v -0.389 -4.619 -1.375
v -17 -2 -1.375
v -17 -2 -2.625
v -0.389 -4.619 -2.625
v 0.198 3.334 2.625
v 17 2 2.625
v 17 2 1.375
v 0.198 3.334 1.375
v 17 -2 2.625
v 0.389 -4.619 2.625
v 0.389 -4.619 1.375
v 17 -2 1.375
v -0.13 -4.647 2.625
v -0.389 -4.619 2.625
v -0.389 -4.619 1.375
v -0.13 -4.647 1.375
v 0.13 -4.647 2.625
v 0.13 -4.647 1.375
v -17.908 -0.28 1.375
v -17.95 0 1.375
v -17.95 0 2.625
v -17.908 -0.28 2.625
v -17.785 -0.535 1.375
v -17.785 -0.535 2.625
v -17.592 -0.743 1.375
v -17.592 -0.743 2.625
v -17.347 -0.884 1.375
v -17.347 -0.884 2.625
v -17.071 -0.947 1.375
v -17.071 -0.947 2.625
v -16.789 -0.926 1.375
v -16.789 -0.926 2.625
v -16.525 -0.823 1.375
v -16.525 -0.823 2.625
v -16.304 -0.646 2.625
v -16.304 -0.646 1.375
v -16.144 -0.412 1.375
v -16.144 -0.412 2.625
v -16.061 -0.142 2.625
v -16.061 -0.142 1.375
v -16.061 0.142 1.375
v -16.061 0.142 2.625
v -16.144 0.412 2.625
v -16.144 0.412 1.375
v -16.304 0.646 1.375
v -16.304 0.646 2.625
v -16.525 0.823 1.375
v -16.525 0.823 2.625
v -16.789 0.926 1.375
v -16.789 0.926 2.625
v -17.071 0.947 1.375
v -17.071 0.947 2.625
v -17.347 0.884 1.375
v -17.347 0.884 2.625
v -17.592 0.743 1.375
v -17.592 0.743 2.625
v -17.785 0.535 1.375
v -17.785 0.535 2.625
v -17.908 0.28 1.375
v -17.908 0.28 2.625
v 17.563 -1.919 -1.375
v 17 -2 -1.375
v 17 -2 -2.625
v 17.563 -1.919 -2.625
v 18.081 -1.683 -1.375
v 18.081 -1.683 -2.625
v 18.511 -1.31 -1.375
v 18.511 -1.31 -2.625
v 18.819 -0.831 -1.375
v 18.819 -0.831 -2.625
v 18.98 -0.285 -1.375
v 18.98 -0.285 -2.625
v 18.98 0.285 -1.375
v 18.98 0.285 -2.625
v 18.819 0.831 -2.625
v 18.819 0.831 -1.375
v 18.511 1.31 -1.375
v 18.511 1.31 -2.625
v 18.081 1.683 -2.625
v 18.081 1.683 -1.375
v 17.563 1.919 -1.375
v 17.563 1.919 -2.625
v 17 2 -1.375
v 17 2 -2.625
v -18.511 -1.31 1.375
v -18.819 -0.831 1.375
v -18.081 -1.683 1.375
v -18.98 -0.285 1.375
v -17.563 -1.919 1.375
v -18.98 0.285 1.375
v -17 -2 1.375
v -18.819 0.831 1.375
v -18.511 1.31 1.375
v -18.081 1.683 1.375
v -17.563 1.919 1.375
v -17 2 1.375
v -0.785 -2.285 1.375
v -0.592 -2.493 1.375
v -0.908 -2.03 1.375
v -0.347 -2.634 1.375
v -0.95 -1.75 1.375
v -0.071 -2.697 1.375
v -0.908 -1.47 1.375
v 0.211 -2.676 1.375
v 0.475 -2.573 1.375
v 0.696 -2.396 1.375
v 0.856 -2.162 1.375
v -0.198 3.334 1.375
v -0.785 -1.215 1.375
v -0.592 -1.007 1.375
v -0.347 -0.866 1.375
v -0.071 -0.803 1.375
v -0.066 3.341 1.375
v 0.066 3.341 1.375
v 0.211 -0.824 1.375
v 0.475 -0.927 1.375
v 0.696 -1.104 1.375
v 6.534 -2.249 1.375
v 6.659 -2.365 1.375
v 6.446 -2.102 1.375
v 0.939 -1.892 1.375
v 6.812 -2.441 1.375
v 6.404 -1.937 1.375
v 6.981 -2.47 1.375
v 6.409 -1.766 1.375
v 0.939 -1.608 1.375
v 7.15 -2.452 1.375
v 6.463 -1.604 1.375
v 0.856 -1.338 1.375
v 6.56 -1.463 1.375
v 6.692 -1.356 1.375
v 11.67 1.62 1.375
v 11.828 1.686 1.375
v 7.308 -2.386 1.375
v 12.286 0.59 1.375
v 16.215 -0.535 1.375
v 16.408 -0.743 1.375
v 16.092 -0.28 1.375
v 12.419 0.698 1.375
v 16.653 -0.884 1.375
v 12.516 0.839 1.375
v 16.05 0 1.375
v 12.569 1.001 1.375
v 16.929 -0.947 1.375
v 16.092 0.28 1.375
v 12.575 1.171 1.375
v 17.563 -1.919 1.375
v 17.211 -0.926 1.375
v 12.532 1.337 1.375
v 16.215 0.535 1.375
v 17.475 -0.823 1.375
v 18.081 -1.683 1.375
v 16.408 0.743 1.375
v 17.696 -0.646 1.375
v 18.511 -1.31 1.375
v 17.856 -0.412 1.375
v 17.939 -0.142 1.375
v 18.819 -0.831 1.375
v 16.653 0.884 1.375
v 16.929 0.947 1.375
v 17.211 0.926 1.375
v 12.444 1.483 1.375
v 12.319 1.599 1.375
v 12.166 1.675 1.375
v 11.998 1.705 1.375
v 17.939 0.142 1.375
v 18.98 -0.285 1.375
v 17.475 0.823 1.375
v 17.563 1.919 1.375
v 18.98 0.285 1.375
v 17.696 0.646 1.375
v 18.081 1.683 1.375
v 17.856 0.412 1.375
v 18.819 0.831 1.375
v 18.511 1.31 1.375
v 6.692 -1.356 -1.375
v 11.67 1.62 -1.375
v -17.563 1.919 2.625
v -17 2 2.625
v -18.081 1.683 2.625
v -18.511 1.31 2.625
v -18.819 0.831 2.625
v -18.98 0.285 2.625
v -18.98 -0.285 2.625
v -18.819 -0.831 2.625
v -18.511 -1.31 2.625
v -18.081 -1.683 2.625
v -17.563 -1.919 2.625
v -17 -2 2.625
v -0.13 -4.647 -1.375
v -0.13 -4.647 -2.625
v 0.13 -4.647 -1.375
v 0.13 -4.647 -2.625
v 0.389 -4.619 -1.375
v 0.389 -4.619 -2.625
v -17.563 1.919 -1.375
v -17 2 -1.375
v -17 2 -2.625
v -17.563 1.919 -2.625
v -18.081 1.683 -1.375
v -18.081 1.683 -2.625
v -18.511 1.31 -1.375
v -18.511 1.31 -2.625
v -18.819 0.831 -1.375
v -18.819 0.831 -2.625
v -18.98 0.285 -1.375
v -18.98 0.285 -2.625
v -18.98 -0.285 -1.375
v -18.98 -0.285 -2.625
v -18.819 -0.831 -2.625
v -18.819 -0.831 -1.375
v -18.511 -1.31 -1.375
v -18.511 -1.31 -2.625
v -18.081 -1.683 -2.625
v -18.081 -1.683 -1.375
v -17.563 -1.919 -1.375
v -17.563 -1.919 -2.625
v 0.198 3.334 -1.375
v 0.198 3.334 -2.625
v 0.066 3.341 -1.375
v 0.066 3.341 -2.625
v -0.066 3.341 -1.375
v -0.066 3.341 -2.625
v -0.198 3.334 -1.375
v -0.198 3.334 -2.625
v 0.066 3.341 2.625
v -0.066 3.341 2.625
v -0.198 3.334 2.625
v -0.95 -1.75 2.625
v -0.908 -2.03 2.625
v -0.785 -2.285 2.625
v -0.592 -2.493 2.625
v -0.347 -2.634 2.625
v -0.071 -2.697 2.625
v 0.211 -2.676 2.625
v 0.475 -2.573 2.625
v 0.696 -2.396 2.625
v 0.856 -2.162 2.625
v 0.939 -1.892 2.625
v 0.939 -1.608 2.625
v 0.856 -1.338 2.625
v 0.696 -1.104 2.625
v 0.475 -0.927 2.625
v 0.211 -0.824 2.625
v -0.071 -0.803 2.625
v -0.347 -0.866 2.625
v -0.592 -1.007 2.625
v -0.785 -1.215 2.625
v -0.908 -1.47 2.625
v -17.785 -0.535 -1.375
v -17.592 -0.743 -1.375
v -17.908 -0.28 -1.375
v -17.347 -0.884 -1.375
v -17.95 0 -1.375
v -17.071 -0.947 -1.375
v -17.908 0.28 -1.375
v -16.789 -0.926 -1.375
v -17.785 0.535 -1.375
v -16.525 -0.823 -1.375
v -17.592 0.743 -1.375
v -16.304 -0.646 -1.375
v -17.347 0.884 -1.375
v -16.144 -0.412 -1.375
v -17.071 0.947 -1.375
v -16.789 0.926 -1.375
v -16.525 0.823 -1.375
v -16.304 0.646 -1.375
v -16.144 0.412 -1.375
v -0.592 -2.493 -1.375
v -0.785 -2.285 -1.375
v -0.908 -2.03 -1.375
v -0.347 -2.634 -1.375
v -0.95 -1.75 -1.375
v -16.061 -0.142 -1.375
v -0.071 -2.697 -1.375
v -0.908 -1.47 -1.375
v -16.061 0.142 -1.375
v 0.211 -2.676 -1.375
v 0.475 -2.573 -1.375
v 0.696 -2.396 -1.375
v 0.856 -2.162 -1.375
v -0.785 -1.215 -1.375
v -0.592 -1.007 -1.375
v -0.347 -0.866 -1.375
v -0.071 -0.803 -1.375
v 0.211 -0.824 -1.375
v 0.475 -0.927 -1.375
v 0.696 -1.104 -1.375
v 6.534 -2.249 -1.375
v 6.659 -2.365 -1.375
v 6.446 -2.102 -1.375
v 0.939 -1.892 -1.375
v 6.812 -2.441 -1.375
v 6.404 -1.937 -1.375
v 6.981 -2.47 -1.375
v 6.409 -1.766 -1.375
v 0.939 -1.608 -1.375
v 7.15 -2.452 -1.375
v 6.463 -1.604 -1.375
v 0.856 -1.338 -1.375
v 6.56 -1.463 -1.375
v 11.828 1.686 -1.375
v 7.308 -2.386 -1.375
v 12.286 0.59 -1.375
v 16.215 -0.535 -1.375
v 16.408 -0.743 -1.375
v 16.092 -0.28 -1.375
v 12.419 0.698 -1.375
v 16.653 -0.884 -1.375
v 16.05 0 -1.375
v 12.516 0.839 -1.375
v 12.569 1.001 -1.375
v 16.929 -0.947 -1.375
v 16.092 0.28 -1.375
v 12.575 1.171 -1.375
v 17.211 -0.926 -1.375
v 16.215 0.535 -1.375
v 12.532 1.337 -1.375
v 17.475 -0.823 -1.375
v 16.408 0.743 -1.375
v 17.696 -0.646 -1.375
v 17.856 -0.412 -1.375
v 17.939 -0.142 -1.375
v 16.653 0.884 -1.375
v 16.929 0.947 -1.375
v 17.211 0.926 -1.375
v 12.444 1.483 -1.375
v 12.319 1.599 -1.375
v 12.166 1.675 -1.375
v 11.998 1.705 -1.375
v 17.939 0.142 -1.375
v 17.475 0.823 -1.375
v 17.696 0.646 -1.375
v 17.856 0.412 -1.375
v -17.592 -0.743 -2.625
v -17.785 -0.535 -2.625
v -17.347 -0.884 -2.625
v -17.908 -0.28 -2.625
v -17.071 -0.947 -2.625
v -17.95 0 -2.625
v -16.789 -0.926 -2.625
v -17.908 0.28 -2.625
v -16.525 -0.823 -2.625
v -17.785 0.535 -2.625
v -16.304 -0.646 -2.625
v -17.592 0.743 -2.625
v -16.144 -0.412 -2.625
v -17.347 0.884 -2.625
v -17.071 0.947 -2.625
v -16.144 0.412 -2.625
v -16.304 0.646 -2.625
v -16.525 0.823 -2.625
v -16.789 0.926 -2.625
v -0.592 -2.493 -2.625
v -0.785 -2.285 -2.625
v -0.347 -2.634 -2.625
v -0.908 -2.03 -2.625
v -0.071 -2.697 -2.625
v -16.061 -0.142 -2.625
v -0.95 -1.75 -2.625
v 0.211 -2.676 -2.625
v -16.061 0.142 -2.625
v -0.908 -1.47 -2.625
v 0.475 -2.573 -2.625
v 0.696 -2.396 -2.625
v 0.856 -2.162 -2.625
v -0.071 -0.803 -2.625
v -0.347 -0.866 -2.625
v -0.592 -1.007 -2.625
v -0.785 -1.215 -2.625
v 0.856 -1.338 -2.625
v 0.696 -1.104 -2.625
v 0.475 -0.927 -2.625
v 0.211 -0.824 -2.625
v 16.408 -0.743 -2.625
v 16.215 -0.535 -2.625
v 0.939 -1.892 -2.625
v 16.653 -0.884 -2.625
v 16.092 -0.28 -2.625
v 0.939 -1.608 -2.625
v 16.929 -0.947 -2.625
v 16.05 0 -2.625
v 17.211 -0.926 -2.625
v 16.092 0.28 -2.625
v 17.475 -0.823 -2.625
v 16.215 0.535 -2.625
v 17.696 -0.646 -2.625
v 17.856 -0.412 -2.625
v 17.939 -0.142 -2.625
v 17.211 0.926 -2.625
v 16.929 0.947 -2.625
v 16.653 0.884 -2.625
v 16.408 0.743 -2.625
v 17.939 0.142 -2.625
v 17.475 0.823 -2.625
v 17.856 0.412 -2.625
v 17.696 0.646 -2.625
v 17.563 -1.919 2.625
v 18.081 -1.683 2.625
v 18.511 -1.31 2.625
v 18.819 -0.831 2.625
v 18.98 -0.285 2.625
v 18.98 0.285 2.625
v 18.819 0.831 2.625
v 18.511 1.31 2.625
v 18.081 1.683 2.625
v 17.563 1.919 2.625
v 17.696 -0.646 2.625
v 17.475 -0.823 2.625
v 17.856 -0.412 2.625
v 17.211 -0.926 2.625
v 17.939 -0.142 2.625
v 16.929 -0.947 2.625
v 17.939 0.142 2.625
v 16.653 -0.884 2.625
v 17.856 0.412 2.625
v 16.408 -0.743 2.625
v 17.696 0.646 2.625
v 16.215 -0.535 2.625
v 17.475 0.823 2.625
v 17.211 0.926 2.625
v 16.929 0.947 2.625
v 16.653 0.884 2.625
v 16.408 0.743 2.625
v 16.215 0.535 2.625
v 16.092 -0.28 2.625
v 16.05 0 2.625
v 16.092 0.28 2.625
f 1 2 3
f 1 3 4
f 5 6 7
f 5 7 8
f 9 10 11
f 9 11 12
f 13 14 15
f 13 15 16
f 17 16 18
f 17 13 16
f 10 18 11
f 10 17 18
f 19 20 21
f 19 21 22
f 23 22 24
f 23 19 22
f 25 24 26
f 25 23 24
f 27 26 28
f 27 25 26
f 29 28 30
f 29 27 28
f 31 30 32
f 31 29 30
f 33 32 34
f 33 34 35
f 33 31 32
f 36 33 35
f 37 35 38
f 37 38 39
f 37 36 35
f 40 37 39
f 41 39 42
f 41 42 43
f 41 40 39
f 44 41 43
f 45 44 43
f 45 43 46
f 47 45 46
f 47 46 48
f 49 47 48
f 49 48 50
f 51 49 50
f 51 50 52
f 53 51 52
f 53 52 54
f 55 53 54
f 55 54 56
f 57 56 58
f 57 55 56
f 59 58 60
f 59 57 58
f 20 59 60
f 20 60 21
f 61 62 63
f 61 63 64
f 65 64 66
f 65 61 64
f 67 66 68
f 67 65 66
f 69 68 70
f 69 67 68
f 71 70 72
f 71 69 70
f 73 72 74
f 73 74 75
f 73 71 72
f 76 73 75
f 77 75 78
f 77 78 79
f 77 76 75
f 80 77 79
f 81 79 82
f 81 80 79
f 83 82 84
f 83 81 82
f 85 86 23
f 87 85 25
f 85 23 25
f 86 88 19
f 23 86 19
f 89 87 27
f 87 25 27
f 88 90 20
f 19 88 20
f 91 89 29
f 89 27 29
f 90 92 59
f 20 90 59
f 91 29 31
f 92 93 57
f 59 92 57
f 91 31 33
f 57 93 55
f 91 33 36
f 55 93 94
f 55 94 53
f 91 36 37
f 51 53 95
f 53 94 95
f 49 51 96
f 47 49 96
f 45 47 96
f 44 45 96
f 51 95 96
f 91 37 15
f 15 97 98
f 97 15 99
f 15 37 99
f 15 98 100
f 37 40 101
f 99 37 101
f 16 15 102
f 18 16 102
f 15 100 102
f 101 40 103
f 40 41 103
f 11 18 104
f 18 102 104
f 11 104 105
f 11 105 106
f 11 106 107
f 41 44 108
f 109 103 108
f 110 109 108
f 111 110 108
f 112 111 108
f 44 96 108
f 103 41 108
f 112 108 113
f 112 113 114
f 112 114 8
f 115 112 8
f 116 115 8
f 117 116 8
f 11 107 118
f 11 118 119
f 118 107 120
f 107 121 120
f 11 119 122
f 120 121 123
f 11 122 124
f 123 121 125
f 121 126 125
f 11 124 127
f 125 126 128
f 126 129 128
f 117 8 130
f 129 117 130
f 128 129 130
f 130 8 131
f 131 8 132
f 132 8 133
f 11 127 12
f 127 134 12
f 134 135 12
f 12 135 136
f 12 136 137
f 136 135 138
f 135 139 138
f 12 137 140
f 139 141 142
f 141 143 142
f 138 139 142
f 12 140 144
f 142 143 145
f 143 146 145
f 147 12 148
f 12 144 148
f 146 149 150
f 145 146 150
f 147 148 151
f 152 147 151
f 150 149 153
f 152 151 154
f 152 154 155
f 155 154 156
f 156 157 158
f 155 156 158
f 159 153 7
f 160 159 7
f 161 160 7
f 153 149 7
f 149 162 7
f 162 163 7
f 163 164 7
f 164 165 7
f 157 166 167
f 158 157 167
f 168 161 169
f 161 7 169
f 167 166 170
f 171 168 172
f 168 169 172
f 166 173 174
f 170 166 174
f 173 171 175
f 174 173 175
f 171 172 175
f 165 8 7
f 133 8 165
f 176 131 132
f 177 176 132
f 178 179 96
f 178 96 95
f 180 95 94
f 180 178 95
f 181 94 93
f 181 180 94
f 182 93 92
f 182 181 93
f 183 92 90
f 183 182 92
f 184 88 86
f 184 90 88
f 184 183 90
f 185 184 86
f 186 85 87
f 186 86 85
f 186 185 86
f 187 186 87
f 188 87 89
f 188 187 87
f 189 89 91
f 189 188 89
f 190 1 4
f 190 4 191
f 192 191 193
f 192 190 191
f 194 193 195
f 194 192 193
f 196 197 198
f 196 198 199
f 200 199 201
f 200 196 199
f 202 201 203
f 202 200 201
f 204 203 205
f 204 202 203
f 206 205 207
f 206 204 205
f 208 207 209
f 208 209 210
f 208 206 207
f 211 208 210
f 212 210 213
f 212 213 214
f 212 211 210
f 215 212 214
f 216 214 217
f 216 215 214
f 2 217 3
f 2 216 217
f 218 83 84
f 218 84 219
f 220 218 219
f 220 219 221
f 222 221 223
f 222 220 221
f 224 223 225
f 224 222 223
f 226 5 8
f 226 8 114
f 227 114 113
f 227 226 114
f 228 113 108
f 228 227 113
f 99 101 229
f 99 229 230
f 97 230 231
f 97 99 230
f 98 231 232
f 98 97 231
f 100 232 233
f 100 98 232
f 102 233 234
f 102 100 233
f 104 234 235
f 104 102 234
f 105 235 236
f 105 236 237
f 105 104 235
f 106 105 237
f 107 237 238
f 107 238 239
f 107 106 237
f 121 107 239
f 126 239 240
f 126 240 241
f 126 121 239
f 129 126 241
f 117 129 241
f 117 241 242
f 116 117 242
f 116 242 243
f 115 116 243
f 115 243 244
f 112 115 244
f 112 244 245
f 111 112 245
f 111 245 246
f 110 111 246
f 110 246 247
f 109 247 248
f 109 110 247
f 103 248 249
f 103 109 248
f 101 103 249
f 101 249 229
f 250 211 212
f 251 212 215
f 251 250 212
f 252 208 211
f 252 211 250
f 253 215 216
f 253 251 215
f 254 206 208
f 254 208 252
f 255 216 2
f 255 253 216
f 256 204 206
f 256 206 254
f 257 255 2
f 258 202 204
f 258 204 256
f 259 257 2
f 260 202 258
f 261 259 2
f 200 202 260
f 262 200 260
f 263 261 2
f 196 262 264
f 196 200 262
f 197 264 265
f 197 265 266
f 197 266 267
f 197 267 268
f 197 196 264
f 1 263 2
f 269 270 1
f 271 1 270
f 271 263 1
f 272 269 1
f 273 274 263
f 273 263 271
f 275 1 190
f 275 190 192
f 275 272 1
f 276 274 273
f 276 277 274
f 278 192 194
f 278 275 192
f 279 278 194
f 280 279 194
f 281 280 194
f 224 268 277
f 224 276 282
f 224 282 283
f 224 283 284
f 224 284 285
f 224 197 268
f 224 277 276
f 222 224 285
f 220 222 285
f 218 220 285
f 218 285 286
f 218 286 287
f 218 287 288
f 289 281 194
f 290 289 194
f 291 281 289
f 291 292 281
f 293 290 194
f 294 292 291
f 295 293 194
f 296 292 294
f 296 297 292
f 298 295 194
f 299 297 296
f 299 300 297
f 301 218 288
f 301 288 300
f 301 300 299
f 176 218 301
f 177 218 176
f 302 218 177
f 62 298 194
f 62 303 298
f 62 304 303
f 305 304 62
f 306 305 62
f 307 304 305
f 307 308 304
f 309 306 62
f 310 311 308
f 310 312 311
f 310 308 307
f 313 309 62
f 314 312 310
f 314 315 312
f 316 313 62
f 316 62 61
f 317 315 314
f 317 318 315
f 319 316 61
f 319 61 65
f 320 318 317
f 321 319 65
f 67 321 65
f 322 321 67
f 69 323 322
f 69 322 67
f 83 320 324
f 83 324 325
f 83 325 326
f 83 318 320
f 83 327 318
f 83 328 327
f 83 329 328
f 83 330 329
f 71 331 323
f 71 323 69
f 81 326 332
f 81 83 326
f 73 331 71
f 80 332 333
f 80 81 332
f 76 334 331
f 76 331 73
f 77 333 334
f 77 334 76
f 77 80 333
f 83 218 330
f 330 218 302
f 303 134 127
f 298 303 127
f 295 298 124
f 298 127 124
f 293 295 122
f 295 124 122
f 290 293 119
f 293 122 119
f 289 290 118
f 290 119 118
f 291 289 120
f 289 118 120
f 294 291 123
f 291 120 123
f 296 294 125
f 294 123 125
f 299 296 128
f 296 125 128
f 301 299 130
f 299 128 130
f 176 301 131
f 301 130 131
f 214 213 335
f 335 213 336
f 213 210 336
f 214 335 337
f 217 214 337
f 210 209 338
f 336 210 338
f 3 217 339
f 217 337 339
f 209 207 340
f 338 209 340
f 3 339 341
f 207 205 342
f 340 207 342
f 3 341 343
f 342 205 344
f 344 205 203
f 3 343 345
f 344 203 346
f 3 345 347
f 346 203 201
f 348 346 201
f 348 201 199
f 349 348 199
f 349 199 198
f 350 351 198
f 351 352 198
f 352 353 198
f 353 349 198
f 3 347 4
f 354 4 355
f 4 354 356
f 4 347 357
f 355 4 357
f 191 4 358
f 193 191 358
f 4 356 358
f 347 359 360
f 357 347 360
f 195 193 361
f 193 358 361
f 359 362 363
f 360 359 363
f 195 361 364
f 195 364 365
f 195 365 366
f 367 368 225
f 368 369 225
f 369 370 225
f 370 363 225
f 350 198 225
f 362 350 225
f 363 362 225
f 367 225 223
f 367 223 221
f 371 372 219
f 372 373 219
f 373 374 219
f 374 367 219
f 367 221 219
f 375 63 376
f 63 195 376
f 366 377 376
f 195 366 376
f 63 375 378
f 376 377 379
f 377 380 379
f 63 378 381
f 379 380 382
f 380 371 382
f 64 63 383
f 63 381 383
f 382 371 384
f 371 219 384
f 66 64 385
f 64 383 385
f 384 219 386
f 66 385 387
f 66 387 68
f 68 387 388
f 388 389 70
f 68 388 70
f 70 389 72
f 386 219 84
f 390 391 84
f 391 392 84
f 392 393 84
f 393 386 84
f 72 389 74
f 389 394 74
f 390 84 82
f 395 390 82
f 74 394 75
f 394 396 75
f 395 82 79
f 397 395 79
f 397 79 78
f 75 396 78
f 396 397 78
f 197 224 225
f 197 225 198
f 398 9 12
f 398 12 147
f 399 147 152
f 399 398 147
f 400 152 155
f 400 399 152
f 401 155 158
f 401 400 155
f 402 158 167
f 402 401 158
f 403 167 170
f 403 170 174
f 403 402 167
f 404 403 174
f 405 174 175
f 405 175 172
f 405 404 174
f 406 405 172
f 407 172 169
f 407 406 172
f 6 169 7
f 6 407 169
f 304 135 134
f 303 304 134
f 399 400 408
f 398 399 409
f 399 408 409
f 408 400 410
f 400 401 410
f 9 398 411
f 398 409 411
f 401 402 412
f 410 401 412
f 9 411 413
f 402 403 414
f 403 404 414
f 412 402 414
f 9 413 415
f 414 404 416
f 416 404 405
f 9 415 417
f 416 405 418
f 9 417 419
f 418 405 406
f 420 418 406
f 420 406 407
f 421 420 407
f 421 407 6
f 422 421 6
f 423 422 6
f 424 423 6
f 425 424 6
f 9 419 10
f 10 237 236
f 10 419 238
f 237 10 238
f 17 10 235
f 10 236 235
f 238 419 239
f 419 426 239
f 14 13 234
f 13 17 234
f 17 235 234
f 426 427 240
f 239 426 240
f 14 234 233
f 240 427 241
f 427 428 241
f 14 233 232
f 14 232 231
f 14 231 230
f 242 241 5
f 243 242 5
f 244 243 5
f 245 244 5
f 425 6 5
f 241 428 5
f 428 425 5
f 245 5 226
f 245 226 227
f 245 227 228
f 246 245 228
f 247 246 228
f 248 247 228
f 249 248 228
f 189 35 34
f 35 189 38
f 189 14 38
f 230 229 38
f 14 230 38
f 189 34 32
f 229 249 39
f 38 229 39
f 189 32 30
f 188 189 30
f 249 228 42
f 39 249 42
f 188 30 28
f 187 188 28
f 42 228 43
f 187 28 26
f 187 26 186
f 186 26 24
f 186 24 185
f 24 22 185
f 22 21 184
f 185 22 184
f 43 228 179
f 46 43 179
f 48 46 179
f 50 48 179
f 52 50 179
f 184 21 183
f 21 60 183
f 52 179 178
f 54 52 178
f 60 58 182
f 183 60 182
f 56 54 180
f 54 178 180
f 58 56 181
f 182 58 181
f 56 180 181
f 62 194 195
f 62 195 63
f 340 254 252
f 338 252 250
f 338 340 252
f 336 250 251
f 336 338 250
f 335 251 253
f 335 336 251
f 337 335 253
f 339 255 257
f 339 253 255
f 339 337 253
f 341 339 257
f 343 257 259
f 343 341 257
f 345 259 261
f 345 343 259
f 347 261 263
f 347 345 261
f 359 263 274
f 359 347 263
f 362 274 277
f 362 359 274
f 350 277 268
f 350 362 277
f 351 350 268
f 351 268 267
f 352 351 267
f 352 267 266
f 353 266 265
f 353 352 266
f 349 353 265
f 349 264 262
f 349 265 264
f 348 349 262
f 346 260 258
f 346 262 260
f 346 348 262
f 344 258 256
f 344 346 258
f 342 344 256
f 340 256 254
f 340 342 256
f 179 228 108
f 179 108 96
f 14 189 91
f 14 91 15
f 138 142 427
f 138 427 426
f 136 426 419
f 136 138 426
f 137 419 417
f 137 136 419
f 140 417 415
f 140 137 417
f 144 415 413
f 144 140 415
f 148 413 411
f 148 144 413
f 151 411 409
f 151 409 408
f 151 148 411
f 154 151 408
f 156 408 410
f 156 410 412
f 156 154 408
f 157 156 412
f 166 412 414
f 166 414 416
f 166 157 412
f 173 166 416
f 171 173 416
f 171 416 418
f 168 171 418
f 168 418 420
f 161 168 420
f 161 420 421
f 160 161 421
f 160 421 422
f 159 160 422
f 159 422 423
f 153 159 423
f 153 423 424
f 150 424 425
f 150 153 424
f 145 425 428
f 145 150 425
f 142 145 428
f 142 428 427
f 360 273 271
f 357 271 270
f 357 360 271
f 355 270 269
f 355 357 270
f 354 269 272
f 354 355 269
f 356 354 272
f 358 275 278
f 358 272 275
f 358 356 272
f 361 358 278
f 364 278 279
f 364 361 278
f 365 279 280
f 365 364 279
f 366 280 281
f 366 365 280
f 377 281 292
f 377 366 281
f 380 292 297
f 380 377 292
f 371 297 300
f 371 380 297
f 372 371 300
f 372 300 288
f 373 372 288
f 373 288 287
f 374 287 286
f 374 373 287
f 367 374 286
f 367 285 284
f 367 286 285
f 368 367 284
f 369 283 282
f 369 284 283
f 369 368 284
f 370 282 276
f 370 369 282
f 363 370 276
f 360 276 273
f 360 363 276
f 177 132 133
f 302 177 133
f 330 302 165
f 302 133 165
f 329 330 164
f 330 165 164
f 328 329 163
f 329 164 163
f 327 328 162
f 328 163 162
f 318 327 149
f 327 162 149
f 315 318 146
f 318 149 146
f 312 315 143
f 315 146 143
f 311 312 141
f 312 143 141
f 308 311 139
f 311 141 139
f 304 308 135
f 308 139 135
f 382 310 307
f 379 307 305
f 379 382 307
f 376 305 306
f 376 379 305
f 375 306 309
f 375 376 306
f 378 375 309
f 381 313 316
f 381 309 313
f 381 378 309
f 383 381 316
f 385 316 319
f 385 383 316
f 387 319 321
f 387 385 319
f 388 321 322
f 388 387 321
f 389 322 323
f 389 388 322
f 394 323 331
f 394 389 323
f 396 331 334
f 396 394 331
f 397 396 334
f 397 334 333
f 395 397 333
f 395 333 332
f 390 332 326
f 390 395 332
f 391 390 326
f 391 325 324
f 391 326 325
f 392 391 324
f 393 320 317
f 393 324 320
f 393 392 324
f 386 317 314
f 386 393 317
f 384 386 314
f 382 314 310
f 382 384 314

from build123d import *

# Parameters (mm, degrees)
SKETCH1_R           = 0.95
BOSS_EXTRUDE1_DEPTH = 2.625
SKETCH2_W           = 37.893298516
SKETCH2_H           = 2.75
CUT_EXTRUDE1_DEPTH  = 13.625
BOSS_EXTRUDE2_DEPTH = 5.25


with BuildPart() as part:
    # Sketch1 → Boss-Extrude1 (new, symmetric)
    with BuildSketch(Plane.XY):
        with BuildLine():
            Line((17, 2), (0.197906371, 3.334283906))
            ThreePointArc((0.197906371, 3.334283906), (0, 3.342129603), (-0.197906371, 3.334283906))
            Line((-0.197906371, 3.334283906), (-17, 2))
            ThreePointArc((-17, 2), (-19, 0), (-17, -2))
            Line((-17, -2), (-0.389436602, -4.619481551))
            ThreePointArc((-0.389436602, -4.619481551), (0, -4.65), (0.389436602, -4.619481551))
            Line((0.389436602, -4.619481551), (17, -2))
            ThreePointArc((17, -2), (19, 0), (17, 2))
        make_face()
        with Locations(Location((-17, 0, 0), (0, 0, 180))):
            Circle(SKETCH1_R, mode=Mode.SUBTRACT)
        with Locations(Location((17, 0, 0), (0, 0, 180))):
            Circle(SKETCH1_R, mode=Mode.SUBTRACT)
        with Locations(Location((0, -1.75, 0), (0, 0, 180))):
            Circle(SKETCH1_R, mode=Mode.SUBTRACT)
    extrude(amount=BOSS_EXTRUDE1_DEPTH, both=True)

    # Sketch2 → Cut-Extrude1 (cut, symmetric)
    with BuildSketch(Plane(origin=(0.264362283, 3.329006525, 0), x_dir=(0.996861721065102, -0.07916254843752263, 0), z_dir=(0.07916254843752263, 0.996861721065102, 0))):
        Rectangle(SKETCH2_W, SKETCH2_H)
    extrude(amount=CUT_EXTRUDE1_DEPTH, both=True, mode=Mode.SUBTRACT)


with BuildPart() as cut_extrude1_piece_1:
    # of the separate pieces the step leaves, piece 1, a body of its own (cut_extrude1_pieces)
    add(part.part.solids().sort_by_distance((17, 2, 2.625))[0])



with BuildPart() as cut_extrude1_piece_2:
    # of the separate pieces the step leaves, piece 2, a body of its own (cut_extrude1_pieces)
    add(part.part.solids().sort_by_distance((17, 2, -1.375))[0])


with BuildPart() as cut_extrude1_piece_1_1:
    add(cut_extrude1_piece_1.part)

    add(cut_extrude1_piece_2.part)  # Boss-Extrude2 merges Cut-Extrude1 piece 2
    # Sketch3 → Boss-Extrude2 (add)
    with BuildSketch(Plane.XY.offset(2.625)):
        with BuildLine():
            Line((6.692125271, -1.355773858), (11.670347401, 1.620348522))
            ThreePointArc((11.670347401, 1.620348522), (12.493210627, 1.413234754), (12.286096859, 0.590371529))
            Line((12.286096859, 0.590371529), (7.307874729, -2.385750851))
            ThreePointArc((7.307874729, -2.385750851), (6.485011504, -2.178637083), (6.692125271, -1.355773858))
        make_face()
    extrude(amount=-BOSS_EXTRUDE2_DEPTH)


solid = cut_extrude1_piece_1_1.part
